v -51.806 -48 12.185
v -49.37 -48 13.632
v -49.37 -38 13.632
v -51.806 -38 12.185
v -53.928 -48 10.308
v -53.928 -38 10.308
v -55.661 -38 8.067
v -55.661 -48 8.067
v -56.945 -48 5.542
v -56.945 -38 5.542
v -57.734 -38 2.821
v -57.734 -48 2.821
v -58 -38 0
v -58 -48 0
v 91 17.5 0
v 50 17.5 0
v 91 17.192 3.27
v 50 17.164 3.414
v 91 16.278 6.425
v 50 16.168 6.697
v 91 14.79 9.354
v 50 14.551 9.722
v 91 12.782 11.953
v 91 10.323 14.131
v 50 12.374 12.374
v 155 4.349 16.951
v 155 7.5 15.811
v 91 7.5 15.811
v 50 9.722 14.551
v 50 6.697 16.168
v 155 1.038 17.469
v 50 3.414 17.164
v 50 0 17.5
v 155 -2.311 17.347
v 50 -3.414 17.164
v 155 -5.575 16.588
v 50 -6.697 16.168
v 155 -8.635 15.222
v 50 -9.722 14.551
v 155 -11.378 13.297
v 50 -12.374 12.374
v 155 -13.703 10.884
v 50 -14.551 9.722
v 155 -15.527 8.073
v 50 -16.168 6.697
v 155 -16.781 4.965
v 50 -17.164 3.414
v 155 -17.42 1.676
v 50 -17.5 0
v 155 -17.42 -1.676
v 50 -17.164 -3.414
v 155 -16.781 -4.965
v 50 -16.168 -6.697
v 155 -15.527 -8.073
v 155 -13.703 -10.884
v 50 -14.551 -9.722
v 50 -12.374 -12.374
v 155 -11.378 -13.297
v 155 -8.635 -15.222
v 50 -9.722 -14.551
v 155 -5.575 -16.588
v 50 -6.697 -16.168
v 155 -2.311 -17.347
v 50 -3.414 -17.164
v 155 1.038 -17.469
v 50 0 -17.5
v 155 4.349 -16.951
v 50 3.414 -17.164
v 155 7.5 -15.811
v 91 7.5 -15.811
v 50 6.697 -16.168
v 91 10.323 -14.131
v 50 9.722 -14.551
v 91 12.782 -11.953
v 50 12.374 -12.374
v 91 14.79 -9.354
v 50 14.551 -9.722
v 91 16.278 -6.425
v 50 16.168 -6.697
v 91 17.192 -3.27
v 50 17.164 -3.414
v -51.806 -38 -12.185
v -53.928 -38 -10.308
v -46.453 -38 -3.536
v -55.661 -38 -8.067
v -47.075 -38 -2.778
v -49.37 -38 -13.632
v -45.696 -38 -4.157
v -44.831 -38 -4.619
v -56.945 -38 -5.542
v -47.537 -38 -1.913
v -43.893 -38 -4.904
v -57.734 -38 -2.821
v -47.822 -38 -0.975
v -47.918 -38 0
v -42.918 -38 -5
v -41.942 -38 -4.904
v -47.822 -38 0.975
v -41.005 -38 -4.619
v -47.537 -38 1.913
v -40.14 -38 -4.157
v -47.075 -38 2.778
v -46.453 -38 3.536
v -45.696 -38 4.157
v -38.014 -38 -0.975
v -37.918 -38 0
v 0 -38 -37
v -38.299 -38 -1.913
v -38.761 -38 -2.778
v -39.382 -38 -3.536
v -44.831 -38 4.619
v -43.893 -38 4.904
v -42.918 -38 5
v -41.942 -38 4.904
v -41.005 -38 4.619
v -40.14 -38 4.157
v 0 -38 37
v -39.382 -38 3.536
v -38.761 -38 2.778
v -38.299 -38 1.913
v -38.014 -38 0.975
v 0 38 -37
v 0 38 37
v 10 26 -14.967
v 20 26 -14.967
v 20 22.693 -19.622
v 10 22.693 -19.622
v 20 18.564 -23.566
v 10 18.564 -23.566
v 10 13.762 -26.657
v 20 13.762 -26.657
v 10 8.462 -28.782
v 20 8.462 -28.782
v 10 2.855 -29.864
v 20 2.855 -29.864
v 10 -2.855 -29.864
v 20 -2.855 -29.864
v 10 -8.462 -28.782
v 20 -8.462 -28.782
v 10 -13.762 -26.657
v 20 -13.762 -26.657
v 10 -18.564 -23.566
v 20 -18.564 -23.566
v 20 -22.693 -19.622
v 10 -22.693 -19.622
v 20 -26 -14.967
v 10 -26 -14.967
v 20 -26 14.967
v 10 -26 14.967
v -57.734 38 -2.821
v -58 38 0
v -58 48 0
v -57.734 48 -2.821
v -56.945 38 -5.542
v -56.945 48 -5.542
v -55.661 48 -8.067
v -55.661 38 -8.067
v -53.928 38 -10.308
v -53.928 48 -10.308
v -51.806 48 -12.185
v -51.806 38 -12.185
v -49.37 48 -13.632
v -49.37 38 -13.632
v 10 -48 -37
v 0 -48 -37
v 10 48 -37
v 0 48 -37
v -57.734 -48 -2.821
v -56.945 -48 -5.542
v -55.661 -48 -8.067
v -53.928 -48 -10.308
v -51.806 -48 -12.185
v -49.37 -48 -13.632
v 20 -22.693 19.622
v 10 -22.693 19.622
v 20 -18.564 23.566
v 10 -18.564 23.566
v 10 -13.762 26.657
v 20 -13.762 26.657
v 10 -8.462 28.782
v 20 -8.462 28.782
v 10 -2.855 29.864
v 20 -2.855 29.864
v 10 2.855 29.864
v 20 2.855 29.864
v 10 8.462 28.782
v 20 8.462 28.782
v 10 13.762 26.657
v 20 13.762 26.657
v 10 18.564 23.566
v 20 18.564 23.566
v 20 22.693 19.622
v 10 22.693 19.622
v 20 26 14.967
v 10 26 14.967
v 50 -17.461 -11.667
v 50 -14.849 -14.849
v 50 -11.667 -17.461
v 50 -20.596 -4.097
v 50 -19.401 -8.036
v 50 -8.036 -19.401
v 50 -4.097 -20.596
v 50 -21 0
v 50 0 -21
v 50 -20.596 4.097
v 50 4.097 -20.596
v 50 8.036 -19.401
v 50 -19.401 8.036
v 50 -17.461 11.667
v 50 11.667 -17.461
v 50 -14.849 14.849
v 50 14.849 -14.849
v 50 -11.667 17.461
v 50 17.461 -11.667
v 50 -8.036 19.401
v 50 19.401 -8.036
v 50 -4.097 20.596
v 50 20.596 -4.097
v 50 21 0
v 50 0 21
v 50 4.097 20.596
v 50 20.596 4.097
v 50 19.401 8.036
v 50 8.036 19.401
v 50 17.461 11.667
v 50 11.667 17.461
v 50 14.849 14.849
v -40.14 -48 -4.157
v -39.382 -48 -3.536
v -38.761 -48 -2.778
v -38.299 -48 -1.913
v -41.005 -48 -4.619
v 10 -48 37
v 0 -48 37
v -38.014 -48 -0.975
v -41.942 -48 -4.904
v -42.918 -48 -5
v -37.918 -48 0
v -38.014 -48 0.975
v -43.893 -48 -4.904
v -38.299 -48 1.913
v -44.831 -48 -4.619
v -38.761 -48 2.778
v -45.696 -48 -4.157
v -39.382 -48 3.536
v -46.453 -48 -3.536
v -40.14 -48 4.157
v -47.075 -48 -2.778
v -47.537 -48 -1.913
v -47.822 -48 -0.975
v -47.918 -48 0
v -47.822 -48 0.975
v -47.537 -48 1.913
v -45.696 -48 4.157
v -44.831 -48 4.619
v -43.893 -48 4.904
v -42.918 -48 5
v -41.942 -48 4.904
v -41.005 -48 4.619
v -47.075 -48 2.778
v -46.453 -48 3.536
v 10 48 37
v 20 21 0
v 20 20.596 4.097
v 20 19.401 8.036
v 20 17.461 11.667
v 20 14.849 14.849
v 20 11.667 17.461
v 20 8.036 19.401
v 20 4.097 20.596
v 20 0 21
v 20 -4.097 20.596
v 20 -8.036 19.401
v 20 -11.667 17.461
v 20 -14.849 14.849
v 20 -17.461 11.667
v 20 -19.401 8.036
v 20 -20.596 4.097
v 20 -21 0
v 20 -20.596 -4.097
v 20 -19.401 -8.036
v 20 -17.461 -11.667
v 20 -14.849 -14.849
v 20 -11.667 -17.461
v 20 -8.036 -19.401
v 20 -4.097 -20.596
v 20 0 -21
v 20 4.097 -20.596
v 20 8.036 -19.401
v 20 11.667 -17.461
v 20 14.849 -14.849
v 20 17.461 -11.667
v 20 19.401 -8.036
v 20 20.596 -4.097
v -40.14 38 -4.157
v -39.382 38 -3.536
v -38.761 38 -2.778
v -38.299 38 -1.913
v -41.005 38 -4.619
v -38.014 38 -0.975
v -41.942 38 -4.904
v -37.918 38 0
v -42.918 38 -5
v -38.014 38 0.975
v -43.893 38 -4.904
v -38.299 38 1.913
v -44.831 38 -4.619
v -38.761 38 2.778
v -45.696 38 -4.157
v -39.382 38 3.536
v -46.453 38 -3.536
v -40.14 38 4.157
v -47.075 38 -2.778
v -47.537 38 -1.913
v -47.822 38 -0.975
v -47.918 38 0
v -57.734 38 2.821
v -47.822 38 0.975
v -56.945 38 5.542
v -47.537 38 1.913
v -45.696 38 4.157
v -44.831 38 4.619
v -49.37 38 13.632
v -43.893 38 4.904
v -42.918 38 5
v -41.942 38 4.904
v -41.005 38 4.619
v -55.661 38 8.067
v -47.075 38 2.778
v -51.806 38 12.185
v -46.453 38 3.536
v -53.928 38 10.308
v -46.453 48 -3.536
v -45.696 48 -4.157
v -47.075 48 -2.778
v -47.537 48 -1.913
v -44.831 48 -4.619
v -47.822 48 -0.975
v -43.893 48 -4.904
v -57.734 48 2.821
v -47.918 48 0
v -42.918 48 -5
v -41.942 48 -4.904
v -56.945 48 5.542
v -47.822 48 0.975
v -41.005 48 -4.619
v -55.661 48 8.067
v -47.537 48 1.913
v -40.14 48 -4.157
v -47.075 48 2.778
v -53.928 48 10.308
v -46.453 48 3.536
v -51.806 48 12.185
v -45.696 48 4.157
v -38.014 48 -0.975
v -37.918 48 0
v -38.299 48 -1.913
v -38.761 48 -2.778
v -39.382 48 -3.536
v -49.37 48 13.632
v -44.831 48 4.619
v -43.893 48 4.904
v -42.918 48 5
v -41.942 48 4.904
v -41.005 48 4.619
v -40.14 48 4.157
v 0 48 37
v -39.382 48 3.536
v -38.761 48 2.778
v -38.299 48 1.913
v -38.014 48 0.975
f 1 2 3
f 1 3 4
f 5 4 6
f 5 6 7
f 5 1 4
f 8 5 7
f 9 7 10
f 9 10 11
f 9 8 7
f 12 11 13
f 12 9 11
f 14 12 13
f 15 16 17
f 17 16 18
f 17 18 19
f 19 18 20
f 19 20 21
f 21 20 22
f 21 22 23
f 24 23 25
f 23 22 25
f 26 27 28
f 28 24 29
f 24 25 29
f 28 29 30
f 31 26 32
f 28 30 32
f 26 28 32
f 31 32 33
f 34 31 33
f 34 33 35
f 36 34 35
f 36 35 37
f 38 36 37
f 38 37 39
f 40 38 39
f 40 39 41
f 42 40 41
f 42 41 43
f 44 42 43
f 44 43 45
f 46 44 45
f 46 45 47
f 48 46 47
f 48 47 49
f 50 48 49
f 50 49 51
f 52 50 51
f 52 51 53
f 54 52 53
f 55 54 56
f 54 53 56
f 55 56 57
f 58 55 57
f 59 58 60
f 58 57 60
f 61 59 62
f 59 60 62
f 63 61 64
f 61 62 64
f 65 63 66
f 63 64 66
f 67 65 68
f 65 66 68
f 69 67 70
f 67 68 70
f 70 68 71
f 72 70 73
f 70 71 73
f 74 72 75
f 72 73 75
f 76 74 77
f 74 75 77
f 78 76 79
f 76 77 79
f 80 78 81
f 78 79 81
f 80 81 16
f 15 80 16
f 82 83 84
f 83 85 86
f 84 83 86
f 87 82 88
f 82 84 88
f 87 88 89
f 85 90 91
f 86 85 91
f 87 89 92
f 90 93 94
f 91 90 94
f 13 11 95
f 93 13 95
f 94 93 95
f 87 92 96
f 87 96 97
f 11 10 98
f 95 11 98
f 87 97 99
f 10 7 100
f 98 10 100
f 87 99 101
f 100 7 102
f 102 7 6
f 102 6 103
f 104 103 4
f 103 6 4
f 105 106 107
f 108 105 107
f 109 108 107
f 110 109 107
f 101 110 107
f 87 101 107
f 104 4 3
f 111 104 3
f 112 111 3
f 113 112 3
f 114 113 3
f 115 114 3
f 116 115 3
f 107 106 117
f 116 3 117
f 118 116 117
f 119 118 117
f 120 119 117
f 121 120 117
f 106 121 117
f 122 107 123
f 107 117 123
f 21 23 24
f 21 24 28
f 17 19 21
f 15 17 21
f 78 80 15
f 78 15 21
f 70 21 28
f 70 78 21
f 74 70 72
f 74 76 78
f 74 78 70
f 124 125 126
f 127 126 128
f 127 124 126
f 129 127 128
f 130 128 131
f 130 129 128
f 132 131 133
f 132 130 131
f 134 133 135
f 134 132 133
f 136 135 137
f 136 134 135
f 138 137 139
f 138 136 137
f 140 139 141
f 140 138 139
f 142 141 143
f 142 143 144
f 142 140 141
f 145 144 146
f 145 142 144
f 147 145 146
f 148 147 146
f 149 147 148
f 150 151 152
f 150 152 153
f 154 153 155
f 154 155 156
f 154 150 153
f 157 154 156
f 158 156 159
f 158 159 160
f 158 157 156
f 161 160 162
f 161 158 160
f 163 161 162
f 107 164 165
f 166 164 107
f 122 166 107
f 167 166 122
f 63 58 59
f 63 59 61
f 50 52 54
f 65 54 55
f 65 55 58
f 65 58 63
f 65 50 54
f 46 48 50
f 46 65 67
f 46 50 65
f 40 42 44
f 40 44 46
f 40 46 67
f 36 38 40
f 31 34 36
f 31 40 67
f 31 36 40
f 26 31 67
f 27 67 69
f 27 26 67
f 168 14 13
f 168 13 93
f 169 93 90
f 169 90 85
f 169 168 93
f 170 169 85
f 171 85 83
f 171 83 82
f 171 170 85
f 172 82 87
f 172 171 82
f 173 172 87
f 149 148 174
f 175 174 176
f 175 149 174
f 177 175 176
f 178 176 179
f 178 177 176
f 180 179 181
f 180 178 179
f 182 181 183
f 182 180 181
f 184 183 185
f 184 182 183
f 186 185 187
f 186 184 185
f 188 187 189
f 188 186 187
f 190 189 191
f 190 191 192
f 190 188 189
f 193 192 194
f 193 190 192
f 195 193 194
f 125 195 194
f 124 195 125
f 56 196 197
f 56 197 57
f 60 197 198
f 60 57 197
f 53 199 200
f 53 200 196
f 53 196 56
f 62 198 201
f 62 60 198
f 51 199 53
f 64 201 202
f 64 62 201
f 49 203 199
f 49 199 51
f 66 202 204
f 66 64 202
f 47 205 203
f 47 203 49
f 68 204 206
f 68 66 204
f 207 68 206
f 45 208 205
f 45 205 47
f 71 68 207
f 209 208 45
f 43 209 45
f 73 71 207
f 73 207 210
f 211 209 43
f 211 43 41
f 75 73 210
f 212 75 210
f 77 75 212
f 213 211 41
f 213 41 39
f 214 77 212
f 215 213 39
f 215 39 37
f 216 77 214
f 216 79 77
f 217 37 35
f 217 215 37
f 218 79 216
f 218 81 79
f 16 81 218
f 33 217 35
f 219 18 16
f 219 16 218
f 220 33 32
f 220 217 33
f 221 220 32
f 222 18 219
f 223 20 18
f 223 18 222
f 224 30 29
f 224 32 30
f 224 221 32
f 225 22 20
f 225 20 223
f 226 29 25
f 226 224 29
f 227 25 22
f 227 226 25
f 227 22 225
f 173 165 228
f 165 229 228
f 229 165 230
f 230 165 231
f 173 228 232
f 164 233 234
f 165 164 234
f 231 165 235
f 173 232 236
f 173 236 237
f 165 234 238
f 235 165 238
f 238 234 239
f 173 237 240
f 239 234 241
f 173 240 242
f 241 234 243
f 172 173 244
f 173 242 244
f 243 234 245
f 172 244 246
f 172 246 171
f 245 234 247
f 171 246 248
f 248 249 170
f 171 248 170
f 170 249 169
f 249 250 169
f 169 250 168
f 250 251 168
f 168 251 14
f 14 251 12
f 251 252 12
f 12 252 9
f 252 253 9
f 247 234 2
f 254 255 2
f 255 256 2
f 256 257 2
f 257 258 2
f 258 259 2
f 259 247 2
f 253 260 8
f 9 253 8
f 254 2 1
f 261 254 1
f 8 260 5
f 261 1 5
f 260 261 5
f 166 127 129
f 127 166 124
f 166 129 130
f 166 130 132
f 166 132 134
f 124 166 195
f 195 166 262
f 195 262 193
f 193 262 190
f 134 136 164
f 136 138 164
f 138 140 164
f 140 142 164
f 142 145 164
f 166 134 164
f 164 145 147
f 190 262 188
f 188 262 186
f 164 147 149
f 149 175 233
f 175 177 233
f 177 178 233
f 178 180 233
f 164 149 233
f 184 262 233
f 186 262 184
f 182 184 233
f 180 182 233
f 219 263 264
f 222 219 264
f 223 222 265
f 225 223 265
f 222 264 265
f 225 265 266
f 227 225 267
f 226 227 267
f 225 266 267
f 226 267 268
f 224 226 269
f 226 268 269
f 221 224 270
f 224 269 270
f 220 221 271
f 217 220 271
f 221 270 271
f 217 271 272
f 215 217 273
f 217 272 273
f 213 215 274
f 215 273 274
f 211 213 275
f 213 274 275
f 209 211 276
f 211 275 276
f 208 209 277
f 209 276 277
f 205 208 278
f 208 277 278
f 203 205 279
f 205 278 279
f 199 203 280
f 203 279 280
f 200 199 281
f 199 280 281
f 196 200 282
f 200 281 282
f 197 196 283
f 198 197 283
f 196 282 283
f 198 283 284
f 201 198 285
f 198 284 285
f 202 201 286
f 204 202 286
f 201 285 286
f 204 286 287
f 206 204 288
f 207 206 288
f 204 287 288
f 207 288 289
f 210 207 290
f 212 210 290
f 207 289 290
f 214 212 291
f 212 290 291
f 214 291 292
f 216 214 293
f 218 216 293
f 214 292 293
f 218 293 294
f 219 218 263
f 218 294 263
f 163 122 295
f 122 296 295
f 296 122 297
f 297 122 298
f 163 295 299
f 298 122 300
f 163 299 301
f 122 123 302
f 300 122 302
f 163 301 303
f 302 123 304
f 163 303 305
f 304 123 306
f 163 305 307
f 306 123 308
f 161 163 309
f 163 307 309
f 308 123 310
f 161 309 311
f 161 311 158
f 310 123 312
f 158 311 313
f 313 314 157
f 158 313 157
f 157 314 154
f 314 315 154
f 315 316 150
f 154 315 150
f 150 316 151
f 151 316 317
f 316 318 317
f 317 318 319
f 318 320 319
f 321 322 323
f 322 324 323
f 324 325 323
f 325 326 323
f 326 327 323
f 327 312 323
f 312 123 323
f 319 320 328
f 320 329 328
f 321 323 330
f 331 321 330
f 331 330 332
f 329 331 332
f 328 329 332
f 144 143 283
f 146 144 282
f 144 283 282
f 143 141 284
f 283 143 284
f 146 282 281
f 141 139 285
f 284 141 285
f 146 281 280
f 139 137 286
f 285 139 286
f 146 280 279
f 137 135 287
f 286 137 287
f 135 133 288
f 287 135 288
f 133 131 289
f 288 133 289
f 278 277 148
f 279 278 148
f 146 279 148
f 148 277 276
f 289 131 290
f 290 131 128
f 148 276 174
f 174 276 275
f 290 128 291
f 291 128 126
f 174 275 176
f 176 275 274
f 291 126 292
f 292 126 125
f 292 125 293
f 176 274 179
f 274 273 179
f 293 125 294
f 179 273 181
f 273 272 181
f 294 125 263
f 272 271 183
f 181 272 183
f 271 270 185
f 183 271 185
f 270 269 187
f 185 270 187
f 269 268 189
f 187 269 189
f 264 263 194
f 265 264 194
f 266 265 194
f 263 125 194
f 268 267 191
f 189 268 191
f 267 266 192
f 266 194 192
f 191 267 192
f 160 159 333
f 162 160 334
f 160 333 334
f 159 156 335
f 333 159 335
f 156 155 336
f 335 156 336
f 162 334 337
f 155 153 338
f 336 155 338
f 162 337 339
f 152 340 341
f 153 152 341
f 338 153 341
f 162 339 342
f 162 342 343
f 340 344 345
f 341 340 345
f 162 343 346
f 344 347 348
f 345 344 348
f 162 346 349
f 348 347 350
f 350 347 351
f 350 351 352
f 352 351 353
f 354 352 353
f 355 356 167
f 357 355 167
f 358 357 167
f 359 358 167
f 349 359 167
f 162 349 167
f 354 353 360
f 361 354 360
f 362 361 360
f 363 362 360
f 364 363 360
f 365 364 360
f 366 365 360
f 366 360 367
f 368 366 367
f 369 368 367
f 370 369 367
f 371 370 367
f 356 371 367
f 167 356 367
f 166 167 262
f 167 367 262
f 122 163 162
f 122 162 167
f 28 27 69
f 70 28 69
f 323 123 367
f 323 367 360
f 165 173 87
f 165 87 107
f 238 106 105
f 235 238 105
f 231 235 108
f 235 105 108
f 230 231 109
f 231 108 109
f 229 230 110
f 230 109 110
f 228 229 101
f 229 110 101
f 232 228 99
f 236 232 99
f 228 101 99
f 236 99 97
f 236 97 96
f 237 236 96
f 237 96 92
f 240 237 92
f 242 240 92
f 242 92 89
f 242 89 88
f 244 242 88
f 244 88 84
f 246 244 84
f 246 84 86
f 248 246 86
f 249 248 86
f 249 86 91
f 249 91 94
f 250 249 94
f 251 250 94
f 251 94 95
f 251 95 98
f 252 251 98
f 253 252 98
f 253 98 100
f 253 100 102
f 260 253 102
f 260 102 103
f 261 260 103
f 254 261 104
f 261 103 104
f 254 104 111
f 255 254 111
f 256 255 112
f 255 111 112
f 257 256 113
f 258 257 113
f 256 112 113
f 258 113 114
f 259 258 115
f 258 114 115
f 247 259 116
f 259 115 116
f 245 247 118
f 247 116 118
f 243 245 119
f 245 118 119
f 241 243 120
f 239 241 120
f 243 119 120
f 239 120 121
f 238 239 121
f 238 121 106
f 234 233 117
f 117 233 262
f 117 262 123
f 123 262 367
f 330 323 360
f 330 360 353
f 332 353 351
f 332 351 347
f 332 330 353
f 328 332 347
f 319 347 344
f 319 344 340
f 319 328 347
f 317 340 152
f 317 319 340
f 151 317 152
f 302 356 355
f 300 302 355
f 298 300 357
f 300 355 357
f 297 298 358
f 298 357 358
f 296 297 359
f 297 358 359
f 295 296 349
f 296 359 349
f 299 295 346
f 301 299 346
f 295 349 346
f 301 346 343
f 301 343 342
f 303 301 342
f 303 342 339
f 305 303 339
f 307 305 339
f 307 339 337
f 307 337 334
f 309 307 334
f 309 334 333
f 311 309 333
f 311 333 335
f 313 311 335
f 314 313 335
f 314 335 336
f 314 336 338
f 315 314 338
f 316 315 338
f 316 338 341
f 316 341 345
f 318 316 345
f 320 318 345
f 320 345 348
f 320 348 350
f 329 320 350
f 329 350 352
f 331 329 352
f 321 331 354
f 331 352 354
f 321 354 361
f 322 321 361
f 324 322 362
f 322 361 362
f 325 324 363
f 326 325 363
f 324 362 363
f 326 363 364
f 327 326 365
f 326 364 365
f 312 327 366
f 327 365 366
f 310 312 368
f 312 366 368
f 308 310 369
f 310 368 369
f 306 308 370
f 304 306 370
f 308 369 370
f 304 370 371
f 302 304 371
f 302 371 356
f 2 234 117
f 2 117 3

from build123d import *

# Parameters (mm, degrees)
EXTRUDE_THIN1_DEPTH     = 37
CUT_EXTRUDE1_DEPTH      = 119.105884697
CUT_EXTRUDE1_DEPTH_BACK = 119.105884697
SKETCH2_3_R             = 5
CUT_EXTRUDE2_DEPTH      = 119.105884697
BOSS_EXTRUDE1_DEPTH     = 10
SKETCH4_R               = 21
BOSS_EXTRUDE2_DEPTH     = 30
SKETCH5_R               = 17.5
BOSS_EXTRUDE3_DEPTH     = 105
CUT_EXTRUDE3_START      = -64
CUT_EXTRUDE3_DEPTH      = 64


with BuildPart() as part:
    # Sketch1 → Extrude-Thin1 (new, symmetric)
    with BuildSketch(Plane.XY):
        Polygon((-58, -38), (0, -38), (0, 38), (-58, 38), (-58, 48), (10, 48), (10, -48), (-58, -48), align=None)
    extrude(amount=EXTRUDE_THIN1_DEPTH, both=True)

    # Sketch2 → Cut-Extrude1 (cut, two sides: drawn at the far end of the back side and taken through both)
    with BuildSketch(Plane(origin=(0, 48, 0), x_dir=(1, 0, 0), z_dir=(0, 1, 0)).offset(-CUT_EXTRUDE1_DEPTH_BACK)):
        with BuildLine():
            ThreePointArc((-49.370277543, -13.632170103), (-55.661234009, -8.067034306), (-58, 5.3e-08))
            Line((-58, 5.3e-08), (-58, -37))
            Line((-58, -37), (0, -37))
            Line((0, -37), (-49.370277543, -13.632170103))
        make_face()
        with BuildLine():
            Line((-49.370277543, 13.632170103), (0, 37))
            Line((0, 37), (-58, 37))
            Line((-58, 37), (-58, 5.3e-08))
            ThreePointArc((-58, 5.3e-08), (-55.661233981, 8.06703435), (-49.370277543, 13.632170103))
        make_face()
    extrude(amount=CUT_EXTRUDE1_DEPTH + CUT_EXTRUDE1_DEPTH_BACK, mode=Mode.SUBTRACT)

    # Sketch2<3> → Cut-Extrude2 (cut, through all)
    with BuildSketch(Plane(origin=(0, 48, 0), x_dir=(1, 0, 0), z_dir=(0, 1, 0))):
        with Locations((-42.917929128, 0)):
            Circle(SKETCH2_3_R)
    extrude(amount=-CUT_EXTRUDE2_DEPTH, mode=Mode.SUBTRACT)

    # Sketch3 → Boss-Extrude1 (add)
    with BuildSketch(Plane(origin=(10, 0, 0), x_dir=(0, 0, -1), z_dir=(1, 0, 0))):
        with BuildLine():
            Line((-14.966629547, 26), (14.966629547, 26))
            ThreePointArc((14.966629547, 26), (30, 0), (14.966629547, -26))
            Line((14.966629547, -26), (-14.966629547, -26))
            ThreePointArc((-14.966629547, -26), (-30, 0), (-14.966629547, 26))
        make_face()
    extrude(amount=BOSS_EXTRUDE1_DEPTH)

    # Sketch4 → Boss-Extrude2 (add)
    with BuildSketch(Plane(origin=(20, 0, 0), x_dir=(0, 0, -1), z_dir=(1, 0, 0))):
        Circle(SKETCH4_R)
    extrude(amount=BOSS_EXTRUDE2_DEPTH)

    # Sketch5 → Boss-Extrude3 (add)
    with BuildSketch(Plane(origin=(50, 0, 0), x_dir=(0, 0, -1), z_dir=(1, 0, 0))):
        Circle(SKETCH5_R)
    extrude(amount=BOSS_EXTRUDE3_DEPTH)

    # Sketch6 → Cut-Extrude3 (cut)
    with BuildSketch(Plane(origin=(155, 0, 0), x_dir=(0, 0, -1), z_dir=(1, 0, 0)).offset(CUT_EXTRUDE3_START)):
        with BuildLine():
            Line((-15.811388301, 7.5), (15.811388301, 7.5))
            ThreePointArc((15.811388301, 7.5), (0, 17.5), (-15.811388301, 7.5))
        make_face()
    extrude(amount=CUT_EXTRUDE3_DEPTH, mode=Mode.SUBTRACT)


solid = part.part
